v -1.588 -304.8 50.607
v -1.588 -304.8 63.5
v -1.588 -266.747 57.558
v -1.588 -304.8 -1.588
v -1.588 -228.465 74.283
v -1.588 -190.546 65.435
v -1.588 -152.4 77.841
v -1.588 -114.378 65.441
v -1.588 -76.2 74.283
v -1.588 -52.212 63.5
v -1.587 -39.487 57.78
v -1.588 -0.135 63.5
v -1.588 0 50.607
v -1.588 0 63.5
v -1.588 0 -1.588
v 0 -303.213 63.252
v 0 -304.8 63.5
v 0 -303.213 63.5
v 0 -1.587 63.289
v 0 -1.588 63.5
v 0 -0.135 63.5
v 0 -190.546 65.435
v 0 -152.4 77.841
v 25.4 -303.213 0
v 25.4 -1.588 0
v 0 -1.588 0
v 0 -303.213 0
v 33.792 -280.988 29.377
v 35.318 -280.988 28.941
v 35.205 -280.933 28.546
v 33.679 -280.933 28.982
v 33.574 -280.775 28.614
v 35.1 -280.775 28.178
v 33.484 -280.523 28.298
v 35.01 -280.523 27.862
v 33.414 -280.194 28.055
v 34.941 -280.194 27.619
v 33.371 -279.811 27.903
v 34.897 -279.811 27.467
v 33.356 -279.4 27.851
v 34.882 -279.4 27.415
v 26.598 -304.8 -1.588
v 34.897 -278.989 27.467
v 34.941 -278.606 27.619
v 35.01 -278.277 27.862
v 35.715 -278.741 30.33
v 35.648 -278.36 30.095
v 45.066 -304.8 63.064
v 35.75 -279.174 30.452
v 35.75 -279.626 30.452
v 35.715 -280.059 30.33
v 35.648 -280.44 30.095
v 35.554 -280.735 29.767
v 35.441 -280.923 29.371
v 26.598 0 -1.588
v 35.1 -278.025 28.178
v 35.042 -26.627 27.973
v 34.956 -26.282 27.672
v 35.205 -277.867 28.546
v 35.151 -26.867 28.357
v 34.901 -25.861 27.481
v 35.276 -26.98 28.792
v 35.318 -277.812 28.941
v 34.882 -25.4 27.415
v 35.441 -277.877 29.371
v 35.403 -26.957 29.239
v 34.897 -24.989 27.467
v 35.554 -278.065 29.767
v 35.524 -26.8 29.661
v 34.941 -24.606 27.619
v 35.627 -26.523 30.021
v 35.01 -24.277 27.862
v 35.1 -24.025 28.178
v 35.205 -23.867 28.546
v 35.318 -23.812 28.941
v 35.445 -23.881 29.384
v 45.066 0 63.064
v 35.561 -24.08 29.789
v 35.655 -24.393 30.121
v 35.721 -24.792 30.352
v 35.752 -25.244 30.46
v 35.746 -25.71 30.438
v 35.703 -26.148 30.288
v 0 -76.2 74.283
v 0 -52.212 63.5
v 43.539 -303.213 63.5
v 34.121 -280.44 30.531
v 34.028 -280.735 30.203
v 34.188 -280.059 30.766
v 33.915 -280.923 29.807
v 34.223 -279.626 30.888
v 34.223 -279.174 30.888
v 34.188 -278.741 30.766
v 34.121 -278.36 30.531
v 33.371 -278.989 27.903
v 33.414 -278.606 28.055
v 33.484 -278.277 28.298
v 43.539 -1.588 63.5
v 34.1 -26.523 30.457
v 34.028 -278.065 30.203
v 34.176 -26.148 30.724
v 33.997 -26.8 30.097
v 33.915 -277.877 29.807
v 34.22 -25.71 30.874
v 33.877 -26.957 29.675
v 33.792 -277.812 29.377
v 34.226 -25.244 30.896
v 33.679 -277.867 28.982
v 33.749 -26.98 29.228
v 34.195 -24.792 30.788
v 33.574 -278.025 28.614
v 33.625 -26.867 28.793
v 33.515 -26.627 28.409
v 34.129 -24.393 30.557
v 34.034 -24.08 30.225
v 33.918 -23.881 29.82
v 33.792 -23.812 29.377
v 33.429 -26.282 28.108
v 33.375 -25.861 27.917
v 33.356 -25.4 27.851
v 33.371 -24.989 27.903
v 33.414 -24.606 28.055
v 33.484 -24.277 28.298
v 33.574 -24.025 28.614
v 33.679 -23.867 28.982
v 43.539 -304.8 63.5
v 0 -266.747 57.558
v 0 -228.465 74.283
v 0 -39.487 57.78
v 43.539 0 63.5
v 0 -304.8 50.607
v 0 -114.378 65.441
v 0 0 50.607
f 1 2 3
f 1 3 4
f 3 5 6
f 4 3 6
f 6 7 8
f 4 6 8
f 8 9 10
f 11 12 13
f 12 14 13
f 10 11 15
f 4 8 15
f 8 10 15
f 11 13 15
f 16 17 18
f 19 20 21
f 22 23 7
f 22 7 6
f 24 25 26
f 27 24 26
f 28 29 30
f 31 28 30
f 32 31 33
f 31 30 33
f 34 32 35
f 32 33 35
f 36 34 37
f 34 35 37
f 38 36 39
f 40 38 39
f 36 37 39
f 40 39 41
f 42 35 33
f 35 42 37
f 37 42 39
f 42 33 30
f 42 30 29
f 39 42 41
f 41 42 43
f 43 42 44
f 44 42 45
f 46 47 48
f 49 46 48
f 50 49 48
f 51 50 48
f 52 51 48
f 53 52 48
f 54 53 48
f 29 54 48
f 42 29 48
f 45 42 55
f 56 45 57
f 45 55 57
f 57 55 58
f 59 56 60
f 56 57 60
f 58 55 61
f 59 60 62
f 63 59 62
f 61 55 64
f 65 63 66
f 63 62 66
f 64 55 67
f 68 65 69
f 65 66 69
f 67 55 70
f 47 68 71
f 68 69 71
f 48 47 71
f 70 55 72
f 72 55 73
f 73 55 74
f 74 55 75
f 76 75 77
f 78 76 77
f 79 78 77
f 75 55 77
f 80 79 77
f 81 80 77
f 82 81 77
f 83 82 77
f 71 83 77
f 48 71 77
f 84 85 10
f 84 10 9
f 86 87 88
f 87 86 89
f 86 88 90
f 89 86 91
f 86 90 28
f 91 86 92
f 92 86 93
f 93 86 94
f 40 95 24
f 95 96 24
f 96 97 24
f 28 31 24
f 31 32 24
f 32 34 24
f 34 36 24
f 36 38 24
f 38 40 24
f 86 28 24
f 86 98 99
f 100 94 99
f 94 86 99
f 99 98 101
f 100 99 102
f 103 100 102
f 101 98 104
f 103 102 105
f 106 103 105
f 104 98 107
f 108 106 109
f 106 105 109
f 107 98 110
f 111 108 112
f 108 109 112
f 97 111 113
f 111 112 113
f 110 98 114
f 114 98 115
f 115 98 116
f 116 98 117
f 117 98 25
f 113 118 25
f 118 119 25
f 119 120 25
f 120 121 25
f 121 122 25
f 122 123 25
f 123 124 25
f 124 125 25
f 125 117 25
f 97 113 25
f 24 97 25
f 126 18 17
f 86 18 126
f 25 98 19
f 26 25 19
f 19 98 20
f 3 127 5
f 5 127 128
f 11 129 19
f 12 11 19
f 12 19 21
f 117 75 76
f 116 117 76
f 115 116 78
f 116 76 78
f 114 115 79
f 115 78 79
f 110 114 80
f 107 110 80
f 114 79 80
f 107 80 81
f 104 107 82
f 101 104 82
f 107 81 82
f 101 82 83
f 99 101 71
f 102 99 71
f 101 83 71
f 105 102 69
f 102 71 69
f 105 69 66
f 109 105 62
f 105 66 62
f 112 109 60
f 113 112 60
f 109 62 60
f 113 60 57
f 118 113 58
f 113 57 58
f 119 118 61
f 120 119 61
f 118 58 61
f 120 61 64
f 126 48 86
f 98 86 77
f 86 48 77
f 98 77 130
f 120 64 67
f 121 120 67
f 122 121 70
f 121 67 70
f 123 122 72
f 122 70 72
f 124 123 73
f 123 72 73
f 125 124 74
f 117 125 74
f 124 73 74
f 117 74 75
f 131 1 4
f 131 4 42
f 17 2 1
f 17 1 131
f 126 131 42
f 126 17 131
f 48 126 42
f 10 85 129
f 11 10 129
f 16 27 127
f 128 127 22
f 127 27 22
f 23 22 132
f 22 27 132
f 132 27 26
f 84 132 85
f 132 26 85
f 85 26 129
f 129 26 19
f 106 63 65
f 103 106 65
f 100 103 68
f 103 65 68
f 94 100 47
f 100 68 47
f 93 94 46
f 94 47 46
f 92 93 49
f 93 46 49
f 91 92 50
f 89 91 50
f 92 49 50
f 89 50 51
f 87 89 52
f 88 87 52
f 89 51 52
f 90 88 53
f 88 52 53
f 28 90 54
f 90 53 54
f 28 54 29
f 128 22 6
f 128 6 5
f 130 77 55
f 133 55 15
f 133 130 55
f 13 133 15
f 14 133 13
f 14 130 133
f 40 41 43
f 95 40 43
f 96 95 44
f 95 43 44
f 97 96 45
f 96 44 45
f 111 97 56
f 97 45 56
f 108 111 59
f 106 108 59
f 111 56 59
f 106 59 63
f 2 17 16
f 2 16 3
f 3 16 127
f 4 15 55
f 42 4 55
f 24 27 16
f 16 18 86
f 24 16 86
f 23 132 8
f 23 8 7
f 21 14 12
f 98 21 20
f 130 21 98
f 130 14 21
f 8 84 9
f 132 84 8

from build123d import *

# Parameters (mm, degrees)
F1_DEPTH  = 304.8
F4_DEPTH  = 1.5875
F6_DEPTH  = 1.5875
F8_DEPTH  = 25.4
F9_DEPTH  = 25.4
F10_DEPTH = 1.5875


with BuildPart() as f1:
    # F0 (on Front) → F1 (new body)
    with BuildSketch(Plane.XZ):
        Polygon((0, 0), (0, 63.5), (-1.5875, 63.5), (-1.5875, -1.5875), (26.5975192948, -1.5875), (45.0656705162, 63.0639608604), (43.5392282085, 63.5), (25.4, 0), align=None)
    extrude(amount=F1_DEPTH)

    # F3 (on face) → F4 (join)
    with BuildSketch(Plane.XZ.offset(304.8)):
        Polygon((43.5392282085, 63.5), (0, 63.5), (0, 0), (25.4, 0), align=None)
    extrude(amount=-F4_DEPTH)

    # F5 (on face) → F6 (join)
    with BuildSketch(Plane(origin=(0, 0, 0), x_dir=(-1, 0, 0), z_dir=(0, 1, 0))):
        Polygon((0, 63.5), (-43.5392282085, 63.5), (-25.4, 0), (0, 0), align=None)
    extrude(amount=-F6_DEPTH)

    # F7 (on face) → F8 (cut)
    with BuildSketch(Plane(origin=(25.0101701183, 0, -7.1443335954), x_dir=(0, 1, 0), z_dir=(0.9615384615, 0, -0.2746703242))):
        with BuildLine():
            ThreePointArc((-279.4, 35.9416069393), (-278.2774679849, 36.4065749241), (-277.8125, 37.5291069393))
            ThreePointArc((-277.8125, 37.5291069393), (-279.4, 39.1166069393), (-280.9875, 37.5291069393))
            ThreePointArc((-280.9875, 37.5291069393), (-280.5225320151, 36.4065749241), (-279.4, 35.9416069393))
        make_face()
        with BuildLine():
            ThreePointArc((-23.8125, 37.5291069393), (-26.5225320151, 38.6516389544), (-25.4, 35.9416069393))
            ThreePointArc((-25.4, 35.9416069393), (-24.2774679849, 36.4065749241), (-23.8125, 37.5291069393))
        make_face()
    extrude(amount=-F8_DEPTH, mode=Mode.SUBTRACT)

    # F2 (on face) → F9 (cut)
    with BuildSketch(Plane.YZ):
        Polygon((-52.2120932715, 63.5), (-39.4870413326, 57.779973409), (-0.1351656424, 63.5), align=None)
        Polygon((-304.8, 63.5), (-266.746729324, 57.5579500411), (-253.1458196474, 63.5), align=None)
    extrude(amount=-F9_DEPTH, mode=Mode.SUBTRACT)

    # F2 (on face) → F10 (join)
    with BuildSketch(Plane.YZ):
        Polygon((-0.1351656424, 63.5), (-39.4870413326, 57.779973409), (0, 63.5), align=None)
        with BuildLine():
            Line((-76.2, 50.6074602206), (0, 50.6074602206))
            ThreePointArc((0, 50.6074602206), (-19.6950538014, 54.4605428278), (-39.4870413326, 57.779973409))
            ThreePointArc((-39.4870413326, 57.779973409), (-57.8141368142, 60.3662538666), (-76.2, 62.4949413282))
            Line((-76.2, 62.4949413282), (-76.2, 50.6074602206))
        make_face()
        with BuildLine():
            Line((-152.4, 50.6074602206), (-76.2, 50.6074602206))
            Line((-76.2, 50.6074602206), (-76.2, 62.4949413282))
            ThreePointArc((-76.2, 62.4949413282), (-81.4321305003, 63.0160017697), (-86.6678194969, 63.5))
            Line((-86.6678194969, 63.5), (-152.4, 63.5))
            Line((-152.4, 63.5), (-152.4, 50.6074602206))
        make_face()
        with BuildLine():
            ThreePointArc((-76.2, 62.4949413282), (-57.8141368142, 60.3662538666), (-39.4870413326, 57.779973409))
            Line((-39.4870413326, 57.779973409), (-52.2120932715, 63.5))
            Line((-52.2120932715, 63.5), (-76.2, 74.2827822634))
            Line((-76.2, 74.2827822634), (-114.3780665248, 65.4410439145))
            ThreePointArc((-114.3780665248, 65.4410439145), (-100.5138654868, 64.6001122426), (-86.6678194969, 63.5))
            Line((-86.6678194969, 63.5), (-76.2, 63.5))
            Line((-76.2, 63.5), (-76.2, 62.4949413282))
        make_face()
        with BuildLine():
            Line((-228.693458648, 50.6074602206), (-152.4, 50.6074602206))
            Line((-152.4, 50.6074602206), (-152.4, 63.5))
            Line((-152.4, 63.5), (-152.4, 66.4151452364))
            ThreePointArc((-152.4, 66.4151452364), (-171.4790500008, 66.1699929381), (-190.545501947, 65.4346979192))
            ThreePointArc((-190.545501947, 65.4346979192), (-209.6384806919, 64.2057492114), (-228.693458648, 62.4852936405))
            Line((-228.693458648, 62.4852936405), (-228.693458648, 50.6074602206))
        make_face()
        with BuildLine():
            Line((-266.746729324, 50.6074602206), (-228.693458648, 50.6074602206))
            Line((-228.693458648, 50.6074602206), (-228.693458648, 62.4852936405))
            ThreePointArc((-228.693458648, 62.4852936405), (-247.7519270715, 60.2674648579), (-266.746729324, 57.5579500411))
            Line((-266.746729324, 57.5579500411), (-266.746729324, 50.6074602206))
        make_face()
        with BuildLine():
            Line((-152.4, 66.4151452364), (-152.4, 63.5))
            Line((-152.4, 63.5), (-86.6678194969, 63.5))
            ThreePointArc((-86.6678194969, 63.5), (-100.5138654868, 64.6001122426), (-114.3780665248, 65.4410439145))
            ThreePointArc((-114.3780665248, 65.4410439145), (-133.3827952989, 66.1715799592), (-152.4, 66.4151452364))
        make_face()
        with BuildLine():
            Line((-304.8, 50.6074602206), (-266.746729324, 50.6074602206))
            Line((-266.746729324, 50.6074602206), (-266.746729324, 57.5579500411))
            ThreePointArc((-266.746729324, 57.5579500411), (-285.818633363, 54.3305469631), (-304.8, 50.6074602206))
        make_face()
        with BuildLine():
            ThreePointArc((-266.746729324, 57.5579500411), (-247.7519270715, 60.2674648579), (-228.693458648, 62.4852936405))
            ThreePointArc((-228.693458648, 62.4852936405), (-209.6384806919, 64.2057492114), (-190.545501947, 65.4346979192))
            Line((-190.545501947, 65.4346979192), (-228.4648343576, 74.2827822634))
            Line((-228.4648343576, 74.2827822634), (-266.746729324, 57.5579500411))
        make_face()
        with BuildLine():
            Line((-152.4, 77.841184886), (-152.4, 66.4151452364))
            ThreePointArc((-152.4, 66.4151452364), (-133.3827952989, 66.1715799592), (-114.3780665248, 65.4410439145))
            Line((-114.3780665248, 65.4410439145), (-152.4, 77.841184886))
        make_face()
        with BuildLine():
            ThreePointArc((-190.545501947, 65.4346979192), (-171.4790500008, 66.1699929381), (-152.4, 66.4151452364))
            Line((-152.4, 66.4151452364), (-152.4, 77.841184886))
            Line((-152.4, 77.841184886), (-190.545501947, 65.4346979192))
        make_face()
    extrude(amount=-F10_DEPTH)


solid = f1.part
